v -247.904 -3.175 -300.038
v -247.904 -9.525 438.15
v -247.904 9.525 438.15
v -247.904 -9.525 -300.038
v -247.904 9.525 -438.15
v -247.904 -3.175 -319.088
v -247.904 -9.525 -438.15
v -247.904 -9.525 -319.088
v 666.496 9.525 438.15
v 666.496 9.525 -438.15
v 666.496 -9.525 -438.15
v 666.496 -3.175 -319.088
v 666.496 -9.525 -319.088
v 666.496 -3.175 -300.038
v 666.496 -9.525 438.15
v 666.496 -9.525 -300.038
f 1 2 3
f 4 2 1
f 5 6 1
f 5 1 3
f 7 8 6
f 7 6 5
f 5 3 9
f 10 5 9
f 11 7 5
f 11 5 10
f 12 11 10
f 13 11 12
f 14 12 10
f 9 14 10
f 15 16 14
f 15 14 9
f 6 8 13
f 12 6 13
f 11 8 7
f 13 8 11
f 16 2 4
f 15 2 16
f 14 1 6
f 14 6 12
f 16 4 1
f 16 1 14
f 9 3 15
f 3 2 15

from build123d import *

# Parameters (mm, degrees)
F0_W     = 914.4
F0_H     = 438.15
F1_DEPTH = 9.525
F3_W     = 914.4
F3_H     = 19.05
F4_DEPTH = 6.35


with BuildPart() as f1:
    # F0 (on Front) → F1 (new body, symmetric)
    with BuildSketch(Plane.XZ):
        with Locations((209.2960046741, 219.075)):
            Rectangle(F0_W, F0_H)
        with Locations((209.2960046741, -219.075)):
            Rectangle(F0_W, F0_H)
    extrude(amount=F1_DEPTH, both=True)

    # F3 (on face) → F4 (cut)
    with BuildSketch(Plane.XZ.offset(9.525)):
        with Locations((209.2960046741, -309.5625)):
            Rectangle(F3_W, F3_H)
    extrude(amount=-F4_DEPTH, mode=Mode.SUBTRACT)


solid = f1.part
